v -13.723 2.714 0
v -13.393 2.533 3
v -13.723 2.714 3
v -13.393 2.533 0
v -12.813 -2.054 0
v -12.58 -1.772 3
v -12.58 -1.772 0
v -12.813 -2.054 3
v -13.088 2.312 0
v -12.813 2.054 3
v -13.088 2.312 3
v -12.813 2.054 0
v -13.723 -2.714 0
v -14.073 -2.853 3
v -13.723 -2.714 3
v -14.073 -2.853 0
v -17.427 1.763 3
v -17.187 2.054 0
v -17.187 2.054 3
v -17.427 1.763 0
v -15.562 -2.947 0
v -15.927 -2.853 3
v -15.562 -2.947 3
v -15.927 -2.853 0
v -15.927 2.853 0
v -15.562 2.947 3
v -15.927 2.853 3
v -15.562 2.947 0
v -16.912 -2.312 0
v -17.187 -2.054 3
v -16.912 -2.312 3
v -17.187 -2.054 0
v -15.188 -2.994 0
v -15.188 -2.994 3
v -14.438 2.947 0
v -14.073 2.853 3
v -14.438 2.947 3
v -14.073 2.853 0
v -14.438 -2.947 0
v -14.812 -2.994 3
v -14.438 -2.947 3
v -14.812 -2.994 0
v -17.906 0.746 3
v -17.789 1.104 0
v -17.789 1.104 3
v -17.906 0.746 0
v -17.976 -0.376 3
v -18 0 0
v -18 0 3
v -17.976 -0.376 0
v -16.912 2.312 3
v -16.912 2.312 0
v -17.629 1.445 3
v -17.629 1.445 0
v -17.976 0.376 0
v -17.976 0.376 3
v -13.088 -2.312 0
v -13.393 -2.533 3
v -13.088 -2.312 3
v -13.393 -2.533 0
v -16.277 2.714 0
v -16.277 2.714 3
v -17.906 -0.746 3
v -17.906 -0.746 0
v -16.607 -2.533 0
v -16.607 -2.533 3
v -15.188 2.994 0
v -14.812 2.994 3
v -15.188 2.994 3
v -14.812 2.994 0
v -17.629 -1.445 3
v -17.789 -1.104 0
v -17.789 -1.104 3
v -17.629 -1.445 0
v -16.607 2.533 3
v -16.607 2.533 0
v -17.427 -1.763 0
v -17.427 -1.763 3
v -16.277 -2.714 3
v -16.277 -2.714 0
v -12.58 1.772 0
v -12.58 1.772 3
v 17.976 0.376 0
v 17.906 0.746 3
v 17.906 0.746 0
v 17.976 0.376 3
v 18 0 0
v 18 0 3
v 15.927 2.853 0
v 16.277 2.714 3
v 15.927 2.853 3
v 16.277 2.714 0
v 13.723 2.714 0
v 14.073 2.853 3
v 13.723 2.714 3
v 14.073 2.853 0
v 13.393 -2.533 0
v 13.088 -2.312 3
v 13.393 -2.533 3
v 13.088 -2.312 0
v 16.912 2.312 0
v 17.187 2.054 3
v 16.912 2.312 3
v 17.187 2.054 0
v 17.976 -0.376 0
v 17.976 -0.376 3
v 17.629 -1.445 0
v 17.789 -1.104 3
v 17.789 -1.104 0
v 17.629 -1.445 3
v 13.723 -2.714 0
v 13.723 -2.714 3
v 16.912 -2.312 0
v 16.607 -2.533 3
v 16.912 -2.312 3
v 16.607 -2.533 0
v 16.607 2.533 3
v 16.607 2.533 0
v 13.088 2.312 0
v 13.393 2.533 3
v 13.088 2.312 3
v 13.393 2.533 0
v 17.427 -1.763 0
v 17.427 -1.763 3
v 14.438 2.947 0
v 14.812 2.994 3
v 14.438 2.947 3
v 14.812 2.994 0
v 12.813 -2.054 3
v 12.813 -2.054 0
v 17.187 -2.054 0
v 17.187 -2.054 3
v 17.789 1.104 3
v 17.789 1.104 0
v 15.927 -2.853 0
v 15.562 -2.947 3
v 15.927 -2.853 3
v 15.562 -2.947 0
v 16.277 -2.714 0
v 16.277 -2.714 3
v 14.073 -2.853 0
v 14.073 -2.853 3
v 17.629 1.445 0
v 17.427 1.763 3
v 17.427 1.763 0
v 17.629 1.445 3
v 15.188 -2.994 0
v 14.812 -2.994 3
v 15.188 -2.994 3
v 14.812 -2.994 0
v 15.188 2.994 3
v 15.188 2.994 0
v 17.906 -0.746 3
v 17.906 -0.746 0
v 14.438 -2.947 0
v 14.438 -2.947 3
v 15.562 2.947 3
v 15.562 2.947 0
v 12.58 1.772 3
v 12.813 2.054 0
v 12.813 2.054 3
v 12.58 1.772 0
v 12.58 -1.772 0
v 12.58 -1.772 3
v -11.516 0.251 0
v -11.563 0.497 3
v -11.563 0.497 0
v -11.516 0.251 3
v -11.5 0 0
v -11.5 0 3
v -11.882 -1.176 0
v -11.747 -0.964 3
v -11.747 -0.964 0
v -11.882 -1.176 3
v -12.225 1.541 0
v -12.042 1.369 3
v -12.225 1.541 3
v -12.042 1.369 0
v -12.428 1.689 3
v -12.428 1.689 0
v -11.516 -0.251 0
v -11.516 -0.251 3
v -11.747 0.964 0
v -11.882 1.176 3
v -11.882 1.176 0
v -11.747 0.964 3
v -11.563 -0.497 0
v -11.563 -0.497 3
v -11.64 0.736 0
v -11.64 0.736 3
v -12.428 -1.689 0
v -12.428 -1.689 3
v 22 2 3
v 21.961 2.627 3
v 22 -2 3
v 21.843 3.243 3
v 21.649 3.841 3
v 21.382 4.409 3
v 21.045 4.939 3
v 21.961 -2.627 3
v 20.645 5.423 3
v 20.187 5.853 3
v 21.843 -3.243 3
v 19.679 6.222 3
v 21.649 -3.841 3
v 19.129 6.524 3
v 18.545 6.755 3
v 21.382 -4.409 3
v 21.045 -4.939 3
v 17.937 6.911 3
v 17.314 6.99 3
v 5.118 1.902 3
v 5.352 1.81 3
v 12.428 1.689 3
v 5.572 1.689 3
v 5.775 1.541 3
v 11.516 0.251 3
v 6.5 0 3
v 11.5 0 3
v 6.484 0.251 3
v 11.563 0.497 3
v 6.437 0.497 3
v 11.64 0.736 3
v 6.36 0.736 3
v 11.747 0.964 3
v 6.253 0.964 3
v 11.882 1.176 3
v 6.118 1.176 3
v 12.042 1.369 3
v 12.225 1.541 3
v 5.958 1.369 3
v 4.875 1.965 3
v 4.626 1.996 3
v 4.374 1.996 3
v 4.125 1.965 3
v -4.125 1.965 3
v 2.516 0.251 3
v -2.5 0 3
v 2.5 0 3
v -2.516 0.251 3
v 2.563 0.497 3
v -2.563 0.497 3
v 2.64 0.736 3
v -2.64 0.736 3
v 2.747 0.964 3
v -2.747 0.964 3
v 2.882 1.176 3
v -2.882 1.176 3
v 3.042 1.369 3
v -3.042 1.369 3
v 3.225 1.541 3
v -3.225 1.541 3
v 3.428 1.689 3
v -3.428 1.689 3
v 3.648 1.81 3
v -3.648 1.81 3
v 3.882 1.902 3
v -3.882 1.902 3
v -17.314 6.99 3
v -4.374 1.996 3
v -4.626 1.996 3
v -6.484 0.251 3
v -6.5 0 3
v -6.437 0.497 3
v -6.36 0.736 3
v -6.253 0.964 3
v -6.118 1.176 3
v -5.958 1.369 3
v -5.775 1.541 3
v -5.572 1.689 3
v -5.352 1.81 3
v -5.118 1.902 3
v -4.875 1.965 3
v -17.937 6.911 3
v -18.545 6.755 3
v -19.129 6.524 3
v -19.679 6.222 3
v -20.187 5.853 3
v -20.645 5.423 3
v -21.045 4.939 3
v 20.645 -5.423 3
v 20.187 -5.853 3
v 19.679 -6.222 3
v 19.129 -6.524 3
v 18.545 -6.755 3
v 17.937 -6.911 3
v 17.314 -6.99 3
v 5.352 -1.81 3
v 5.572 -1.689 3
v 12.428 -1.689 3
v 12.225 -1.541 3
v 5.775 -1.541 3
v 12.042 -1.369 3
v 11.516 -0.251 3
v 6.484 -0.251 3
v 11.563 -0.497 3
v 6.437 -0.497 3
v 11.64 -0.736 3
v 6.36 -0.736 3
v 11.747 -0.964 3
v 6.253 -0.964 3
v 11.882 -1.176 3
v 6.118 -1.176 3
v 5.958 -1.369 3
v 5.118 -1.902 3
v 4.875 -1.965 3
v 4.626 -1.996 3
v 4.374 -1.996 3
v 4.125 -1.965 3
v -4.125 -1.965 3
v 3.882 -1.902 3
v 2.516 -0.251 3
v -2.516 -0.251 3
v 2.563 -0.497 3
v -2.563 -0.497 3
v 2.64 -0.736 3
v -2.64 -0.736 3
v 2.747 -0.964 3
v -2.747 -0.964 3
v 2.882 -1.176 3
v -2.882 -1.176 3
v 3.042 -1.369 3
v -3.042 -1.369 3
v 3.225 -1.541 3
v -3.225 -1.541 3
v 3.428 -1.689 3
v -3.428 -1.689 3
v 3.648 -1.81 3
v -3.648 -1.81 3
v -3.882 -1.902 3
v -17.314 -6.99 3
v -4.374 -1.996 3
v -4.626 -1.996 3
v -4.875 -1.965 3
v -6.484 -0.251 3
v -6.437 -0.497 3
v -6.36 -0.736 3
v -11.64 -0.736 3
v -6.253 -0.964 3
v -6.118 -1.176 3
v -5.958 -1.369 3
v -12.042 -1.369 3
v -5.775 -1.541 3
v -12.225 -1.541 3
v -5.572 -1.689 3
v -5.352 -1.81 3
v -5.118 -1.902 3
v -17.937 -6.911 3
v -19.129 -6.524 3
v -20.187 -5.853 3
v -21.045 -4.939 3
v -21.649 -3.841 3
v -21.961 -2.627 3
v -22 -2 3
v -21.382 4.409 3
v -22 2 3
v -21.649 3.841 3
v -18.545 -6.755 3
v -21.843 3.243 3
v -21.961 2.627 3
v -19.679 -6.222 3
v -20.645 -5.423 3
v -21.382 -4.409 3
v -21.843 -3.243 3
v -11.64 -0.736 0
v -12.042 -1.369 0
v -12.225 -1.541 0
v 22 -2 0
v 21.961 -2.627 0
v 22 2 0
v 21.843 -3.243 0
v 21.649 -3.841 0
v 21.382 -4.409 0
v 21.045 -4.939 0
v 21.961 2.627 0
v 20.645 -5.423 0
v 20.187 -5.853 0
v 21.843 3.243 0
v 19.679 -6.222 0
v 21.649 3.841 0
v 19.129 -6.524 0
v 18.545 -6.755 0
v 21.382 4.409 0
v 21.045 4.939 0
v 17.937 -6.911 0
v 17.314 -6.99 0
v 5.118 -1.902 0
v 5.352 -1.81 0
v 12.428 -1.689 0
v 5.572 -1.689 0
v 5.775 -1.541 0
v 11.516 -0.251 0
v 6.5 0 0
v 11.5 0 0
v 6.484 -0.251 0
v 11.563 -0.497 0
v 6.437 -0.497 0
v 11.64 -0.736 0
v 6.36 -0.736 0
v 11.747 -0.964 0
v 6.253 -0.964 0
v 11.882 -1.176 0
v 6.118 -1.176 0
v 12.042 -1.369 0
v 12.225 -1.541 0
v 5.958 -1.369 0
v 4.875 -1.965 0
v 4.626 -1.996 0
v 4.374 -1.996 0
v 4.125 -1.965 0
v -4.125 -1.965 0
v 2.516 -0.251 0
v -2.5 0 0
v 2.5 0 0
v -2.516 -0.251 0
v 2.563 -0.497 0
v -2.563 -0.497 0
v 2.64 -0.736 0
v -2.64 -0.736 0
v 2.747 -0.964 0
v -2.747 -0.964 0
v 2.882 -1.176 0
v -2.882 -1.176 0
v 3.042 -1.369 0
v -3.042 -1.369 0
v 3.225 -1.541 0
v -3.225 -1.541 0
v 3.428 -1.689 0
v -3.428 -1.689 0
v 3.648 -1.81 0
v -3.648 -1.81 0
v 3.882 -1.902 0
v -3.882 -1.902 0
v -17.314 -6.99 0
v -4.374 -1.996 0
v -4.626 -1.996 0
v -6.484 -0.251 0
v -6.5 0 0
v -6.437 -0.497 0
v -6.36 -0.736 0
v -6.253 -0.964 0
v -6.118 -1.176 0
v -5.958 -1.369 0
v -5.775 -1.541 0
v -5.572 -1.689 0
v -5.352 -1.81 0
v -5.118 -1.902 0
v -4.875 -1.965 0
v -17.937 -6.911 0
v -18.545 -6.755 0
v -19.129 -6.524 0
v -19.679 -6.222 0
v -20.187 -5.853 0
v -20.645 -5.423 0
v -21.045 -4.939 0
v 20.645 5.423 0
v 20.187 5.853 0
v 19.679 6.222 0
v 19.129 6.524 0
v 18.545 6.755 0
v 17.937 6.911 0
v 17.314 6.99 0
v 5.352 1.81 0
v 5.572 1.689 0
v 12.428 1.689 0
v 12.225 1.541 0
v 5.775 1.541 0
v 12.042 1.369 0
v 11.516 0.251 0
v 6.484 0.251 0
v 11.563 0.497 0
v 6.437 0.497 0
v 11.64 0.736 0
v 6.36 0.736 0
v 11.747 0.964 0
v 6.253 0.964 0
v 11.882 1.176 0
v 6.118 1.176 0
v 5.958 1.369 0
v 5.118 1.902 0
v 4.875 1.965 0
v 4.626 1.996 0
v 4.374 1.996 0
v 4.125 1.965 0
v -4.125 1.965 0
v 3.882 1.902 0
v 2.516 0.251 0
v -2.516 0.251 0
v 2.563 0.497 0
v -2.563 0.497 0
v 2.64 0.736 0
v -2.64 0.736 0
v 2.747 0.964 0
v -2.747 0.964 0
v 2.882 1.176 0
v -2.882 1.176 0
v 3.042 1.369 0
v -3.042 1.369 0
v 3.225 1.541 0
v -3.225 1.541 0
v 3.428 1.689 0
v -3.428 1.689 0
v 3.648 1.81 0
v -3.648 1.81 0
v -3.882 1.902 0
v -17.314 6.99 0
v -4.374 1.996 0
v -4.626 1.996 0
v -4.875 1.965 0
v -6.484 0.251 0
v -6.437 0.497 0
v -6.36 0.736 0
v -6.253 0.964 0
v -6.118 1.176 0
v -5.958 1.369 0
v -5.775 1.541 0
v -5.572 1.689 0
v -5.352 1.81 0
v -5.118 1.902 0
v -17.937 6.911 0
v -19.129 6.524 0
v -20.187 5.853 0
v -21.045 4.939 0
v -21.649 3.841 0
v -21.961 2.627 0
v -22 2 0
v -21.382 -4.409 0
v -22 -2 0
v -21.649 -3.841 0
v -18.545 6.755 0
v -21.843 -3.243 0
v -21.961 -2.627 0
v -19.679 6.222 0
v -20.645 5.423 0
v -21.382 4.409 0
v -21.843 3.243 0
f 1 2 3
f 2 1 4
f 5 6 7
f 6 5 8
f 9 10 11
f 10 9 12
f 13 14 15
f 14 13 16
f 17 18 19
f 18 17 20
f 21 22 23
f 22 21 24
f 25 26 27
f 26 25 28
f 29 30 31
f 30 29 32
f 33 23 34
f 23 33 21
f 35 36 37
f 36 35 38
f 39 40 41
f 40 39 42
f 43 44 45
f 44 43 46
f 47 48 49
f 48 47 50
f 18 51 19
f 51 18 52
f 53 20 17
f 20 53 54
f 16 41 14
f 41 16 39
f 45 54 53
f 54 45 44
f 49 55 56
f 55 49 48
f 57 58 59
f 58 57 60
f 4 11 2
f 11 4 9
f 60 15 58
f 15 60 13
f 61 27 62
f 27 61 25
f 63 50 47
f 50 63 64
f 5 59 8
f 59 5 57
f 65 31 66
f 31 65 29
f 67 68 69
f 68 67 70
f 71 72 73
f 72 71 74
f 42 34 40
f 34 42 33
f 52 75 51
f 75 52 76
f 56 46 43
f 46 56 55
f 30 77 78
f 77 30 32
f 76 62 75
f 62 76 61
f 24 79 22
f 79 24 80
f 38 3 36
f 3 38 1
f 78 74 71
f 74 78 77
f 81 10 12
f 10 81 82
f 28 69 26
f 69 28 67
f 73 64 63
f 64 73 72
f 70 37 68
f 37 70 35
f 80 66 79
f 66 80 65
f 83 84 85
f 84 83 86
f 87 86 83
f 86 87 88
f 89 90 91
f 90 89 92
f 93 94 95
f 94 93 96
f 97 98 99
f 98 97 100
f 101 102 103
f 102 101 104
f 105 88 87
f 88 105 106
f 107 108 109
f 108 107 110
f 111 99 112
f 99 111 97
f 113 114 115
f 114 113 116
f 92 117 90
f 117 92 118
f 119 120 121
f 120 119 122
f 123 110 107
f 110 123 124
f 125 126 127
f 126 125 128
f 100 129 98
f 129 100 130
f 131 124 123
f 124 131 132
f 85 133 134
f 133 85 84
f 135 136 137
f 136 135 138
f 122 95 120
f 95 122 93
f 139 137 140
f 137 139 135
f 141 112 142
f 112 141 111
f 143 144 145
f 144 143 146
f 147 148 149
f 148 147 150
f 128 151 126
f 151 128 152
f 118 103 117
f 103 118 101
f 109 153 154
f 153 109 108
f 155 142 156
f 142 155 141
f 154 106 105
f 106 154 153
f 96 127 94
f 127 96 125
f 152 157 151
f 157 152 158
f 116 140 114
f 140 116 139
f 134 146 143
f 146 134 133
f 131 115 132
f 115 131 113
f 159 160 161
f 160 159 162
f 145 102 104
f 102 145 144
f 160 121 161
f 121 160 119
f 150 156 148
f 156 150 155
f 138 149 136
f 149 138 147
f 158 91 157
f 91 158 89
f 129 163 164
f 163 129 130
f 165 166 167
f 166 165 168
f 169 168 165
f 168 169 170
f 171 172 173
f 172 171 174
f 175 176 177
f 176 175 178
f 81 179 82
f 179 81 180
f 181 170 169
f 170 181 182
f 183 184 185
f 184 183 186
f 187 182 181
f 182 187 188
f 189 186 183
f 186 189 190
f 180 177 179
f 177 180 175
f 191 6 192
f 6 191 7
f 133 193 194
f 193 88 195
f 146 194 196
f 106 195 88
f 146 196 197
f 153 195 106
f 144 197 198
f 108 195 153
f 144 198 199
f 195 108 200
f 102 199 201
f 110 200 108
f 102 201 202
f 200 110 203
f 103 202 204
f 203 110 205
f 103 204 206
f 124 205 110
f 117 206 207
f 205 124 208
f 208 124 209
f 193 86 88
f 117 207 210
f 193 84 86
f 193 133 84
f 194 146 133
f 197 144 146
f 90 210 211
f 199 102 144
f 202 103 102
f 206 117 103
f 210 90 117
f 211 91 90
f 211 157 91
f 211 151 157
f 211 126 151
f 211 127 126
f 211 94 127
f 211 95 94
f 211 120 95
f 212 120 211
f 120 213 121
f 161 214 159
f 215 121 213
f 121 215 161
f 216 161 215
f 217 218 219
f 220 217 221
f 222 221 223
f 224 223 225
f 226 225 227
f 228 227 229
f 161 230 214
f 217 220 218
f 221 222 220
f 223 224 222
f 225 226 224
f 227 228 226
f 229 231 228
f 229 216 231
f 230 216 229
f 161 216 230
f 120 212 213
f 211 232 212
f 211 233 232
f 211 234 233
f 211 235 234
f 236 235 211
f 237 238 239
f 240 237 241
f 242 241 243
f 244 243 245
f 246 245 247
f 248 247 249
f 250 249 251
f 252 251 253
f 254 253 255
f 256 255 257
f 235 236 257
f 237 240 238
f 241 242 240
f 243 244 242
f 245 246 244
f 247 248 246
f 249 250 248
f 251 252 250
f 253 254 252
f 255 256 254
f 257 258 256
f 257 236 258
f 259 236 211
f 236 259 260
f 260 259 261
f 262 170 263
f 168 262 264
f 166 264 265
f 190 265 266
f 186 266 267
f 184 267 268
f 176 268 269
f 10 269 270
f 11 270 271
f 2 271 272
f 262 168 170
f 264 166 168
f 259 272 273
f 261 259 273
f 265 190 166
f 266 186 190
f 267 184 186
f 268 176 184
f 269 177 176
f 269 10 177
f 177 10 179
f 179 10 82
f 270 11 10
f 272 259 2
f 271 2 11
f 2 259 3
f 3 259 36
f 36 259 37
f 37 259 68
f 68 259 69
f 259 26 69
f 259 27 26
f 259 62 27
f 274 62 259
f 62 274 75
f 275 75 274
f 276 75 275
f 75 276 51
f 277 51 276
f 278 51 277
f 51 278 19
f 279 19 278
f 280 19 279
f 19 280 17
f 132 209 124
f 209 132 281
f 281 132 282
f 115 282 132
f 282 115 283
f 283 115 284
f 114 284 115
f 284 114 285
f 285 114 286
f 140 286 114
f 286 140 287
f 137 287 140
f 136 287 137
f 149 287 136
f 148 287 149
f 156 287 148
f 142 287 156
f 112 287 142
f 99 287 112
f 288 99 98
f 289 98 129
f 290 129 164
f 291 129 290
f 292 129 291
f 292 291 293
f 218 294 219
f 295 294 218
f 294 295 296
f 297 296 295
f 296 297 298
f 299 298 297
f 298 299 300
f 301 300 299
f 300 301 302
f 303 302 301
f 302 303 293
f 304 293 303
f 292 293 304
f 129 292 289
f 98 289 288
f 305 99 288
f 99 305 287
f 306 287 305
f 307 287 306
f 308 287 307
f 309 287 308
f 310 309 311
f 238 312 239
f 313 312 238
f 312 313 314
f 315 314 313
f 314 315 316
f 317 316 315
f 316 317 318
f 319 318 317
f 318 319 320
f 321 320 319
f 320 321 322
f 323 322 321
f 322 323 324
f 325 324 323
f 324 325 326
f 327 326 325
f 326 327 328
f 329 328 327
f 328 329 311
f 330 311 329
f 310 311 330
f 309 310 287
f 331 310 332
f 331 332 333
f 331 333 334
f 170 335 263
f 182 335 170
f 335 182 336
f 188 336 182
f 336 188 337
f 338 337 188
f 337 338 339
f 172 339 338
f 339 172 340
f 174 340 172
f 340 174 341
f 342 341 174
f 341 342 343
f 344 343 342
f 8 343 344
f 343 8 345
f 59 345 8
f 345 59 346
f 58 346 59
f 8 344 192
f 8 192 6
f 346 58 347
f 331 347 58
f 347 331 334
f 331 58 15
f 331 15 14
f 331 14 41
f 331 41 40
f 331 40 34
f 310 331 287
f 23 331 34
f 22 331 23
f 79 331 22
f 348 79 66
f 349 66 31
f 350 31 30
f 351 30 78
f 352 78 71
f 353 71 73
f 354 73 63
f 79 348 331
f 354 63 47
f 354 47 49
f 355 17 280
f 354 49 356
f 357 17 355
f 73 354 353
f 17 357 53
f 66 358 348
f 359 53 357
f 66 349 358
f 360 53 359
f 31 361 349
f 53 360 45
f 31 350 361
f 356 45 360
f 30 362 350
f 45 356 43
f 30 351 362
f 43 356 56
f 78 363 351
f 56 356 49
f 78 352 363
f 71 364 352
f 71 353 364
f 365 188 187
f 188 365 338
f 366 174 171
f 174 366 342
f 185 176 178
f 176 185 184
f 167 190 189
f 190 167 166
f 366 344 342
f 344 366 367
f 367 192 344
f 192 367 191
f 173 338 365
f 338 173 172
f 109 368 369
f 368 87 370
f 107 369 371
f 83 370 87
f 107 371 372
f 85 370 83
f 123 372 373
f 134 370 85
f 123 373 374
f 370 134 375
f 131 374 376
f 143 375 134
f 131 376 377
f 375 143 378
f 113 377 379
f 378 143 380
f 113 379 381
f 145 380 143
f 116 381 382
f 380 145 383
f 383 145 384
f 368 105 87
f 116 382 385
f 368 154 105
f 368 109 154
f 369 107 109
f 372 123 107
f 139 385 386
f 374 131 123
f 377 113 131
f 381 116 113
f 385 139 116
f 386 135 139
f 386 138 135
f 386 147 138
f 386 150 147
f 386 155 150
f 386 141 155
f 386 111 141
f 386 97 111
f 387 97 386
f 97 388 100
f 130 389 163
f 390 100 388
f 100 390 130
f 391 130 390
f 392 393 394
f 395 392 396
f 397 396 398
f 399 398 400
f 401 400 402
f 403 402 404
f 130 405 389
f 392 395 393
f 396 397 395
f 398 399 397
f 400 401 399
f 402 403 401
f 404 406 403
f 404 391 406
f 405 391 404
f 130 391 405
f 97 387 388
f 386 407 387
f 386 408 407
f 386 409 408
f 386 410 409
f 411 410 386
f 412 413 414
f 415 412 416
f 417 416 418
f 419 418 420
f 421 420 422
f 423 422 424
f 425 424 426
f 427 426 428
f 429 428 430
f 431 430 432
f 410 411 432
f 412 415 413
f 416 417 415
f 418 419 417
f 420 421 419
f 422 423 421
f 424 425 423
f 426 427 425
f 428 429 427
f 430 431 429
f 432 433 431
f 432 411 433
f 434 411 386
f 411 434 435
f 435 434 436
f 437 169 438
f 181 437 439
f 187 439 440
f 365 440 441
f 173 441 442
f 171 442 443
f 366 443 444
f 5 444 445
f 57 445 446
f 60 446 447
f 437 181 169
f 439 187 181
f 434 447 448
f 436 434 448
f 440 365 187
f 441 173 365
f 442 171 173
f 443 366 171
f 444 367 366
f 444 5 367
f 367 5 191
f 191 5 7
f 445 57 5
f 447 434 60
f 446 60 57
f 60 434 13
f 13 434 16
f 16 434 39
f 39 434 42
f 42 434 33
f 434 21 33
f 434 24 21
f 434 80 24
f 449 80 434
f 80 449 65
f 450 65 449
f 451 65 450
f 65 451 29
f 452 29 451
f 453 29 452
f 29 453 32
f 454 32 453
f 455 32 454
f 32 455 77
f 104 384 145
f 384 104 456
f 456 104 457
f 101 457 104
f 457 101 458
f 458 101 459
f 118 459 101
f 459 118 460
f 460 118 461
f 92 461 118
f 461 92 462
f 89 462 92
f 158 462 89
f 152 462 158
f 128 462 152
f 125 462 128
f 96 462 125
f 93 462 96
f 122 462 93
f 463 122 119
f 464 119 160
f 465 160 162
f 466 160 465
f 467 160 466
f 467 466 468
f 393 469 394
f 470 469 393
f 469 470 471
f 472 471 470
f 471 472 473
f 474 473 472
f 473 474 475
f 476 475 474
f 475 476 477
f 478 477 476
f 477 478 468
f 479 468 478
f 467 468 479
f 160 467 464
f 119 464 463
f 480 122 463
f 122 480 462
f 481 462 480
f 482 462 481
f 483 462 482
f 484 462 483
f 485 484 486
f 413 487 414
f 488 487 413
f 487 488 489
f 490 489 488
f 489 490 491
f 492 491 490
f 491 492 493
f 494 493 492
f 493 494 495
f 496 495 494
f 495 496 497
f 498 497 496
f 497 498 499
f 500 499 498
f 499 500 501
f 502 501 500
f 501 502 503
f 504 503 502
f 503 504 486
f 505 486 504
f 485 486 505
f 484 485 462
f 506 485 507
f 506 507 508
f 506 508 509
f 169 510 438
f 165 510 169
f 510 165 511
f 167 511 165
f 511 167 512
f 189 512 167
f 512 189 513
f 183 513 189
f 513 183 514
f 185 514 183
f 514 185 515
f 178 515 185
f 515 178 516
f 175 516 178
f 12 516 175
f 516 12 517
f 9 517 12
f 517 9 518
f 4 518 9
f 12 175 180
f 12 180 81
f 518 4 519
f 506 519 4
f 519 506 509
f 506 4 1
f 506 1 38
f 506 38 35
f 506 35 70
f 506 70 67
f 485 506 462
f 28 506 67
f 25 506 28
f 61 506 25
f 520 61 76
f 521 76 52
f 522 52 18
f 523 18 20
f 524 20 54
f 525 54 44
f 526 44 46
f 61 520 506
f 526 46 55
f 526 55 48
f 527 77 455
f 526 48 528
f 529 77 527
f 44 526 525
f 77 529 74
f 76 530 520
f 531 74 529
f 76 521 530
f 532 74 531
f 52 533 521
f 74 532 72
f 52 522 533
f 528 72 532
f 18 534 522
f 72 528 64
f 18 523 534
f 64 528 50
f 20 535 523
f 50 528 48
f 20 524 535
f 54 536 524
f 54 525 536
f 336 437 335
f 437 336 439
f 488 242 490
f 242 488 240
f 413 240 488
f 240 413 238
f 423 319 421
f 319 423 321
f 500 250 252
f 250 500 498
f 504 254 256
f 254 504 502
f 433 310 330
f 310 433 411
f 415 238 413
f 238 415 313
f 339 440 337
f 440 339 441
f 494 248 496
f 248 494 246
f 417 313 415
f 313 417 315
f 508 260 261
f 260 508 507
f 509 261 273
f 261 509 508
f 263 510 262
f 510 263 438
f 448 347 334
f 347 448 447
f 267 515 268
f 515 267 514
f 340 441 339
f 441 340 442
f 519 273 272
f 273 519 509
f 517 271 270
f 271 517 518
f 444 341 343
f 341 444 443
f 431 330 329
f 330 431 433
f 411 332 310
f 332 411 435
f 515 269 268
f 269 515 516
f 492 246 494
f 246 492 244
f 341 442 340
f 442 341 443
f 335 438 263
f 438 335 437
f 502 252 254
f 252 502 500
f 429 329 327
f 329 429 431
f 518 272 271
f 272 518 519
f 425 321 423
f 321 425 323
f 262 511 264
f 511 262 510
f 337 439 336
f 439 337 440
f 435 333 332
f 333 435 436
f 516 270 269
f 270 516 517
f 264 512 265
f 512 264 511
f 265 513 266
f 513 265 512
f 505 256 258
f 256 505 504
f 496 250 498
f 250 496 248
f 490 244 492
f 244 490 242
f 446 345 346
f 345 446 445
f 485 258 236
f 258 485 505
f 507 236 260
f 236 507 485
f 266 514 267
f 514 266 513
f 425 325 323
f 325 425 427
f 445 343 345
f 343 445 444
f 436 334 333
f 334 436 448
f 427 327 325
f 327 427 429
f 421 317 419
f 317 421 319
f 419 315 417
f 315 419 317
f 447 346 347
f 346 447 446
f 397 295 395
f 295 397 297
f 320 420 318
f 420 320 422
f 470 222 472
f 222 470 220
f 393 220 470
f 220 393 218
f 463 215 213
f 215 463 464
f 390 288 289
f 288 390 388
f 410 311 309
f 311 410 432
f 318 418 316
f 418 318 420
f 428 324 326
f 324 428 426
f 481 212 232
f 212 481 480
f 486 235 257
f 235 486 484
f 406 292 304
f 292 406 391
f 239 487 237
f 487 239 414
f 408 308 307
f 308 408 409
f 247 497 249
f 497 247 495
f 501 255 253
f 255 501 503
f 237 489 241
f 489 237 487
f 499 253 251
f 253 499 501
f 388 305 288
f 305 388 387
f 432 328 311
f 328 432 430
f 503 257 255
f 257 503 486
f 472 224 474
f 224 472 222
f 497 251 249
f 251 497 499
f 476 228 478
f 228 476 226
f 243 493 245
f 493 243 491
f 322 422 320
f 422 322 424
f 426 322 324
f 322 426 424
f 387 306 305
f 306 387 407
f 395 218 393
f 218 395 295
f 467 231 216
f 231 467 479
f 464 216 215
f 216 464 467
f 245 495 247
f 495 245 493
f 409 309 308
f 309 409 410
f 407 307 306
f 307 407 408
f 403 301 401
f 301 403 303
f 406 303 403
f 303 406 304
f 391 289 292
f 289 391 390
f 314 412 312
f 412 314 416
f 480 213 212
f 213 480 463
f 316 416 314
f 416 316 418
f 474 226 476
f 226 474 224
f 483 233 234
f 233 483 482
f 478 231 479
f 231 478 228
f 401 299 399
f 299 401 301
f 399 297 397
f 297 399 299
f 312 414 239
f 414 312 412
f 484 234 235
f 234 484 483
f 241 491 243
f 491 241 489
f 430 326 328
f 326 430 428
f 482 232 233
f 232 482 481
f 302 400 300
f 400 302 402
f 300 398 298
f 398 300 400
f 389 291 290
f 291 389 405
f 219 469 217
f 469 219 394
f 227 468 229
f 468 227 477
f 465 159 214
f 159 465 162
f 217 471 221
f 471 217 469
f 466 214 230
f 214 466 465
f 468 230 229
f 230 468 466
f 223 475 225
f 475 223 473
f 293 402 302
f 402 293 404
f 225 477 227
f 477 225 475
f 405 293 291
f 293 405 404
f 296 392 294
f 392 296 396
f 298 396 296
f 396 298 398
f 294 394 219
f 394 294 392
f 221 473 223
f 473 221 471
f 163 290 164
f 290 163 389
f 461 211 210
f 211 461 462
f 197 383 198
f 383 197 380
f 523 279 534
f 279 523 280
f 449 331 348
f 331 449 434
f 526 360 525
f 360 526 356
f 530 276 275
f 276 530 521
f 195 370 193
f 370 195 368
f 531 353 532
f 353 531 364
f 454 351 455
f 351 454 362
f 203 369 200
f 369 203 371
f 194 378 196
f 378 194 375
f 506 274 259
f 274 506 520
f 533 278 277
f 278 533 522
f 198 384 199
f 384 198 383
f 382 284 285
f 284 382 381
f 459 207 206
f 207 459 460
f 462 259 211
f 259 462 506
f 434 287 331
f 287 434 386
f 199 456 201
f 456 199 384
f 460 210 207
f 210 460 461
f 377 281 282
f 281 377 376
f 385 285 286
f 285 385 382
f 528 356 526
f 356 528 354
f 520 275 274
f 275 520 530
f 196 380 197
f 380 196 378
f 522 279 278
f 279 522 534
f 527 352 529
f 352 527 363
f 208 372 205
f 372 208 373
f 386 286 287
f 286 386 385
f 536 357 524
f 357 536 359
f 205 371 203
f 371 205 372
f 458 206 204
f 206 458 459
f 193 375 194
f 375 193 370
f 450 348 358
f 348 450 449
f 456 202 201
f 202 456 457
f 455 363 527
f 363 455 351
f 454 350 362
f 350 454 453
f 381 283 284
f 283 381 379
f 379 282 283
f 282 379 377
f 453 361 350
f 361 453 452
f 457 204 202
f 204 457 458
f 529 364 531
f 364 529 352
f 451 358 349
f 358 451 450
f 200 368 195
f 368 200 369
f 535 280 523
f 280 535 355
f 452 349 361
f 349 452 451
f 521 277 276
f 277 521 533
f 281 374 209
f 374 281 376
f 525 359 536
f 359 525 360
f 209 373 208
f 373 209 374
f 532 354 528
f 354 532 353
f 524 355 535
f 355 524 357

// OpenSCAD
$fn = 50;


difference() {
	union() {
		hull() {
			translate(v = [-17.0000000000, 2.0000000000, 0]) {
				cylinder(h = 3, r = 5);
			}
			translate(v = [17.0000000000, 2.0000000000, 0]) {
				cylinder(h = 3, r = 5);
			}
			translate(v = [-17.0000000000, -2.0000000000, 0]) {
				cylinder(h = 3, r = 5);
			}
			translate(v = [17.0000000000, -2.0000000000, 0]) {
				cylinder(h = 3, r = 5);
			}
		}
	}
	union() {
		#translate(v = [-15.0000000000, 0.0000000000, -100.0000000000]) {
			cylinder(h = 200, r = 3.0000000000);
		}
		#translate(v = [-15.0000000000, 0.0000000000, -100.0000000000]) {
			cylinder(h = 200, r = 3.0000000000);
		}
		#translate(v = [15.0000000000, 0.0000000000, -100.0000000000]) {
			cylinder(h = 200, r = 3.0000000000);
		}
		#translate(v = [15.0000000000, 0.0000000000, -100.0000000000]) {
			cylinder(h = 200, r = 3.0000000000);
		}
		#translate(v = [-13.5000000000, 0, 0]) {
			cylinder(h = 3, r = 2.0000000000);
		}
		#translate(v = [-4.5000000000, 0, 0]) {
			cylinder(h = 3, r = 2.0000000000);
		}
		#translate(v = [4.5000000000, 0, 0]) {
			cylinder(h = 3, r = 2.0000000000);
		}
		#translate(v = [13.5000000000, 0, 0]) {
			cylinder(h = 3, r = 2.0000000000);
		}
	}
}
